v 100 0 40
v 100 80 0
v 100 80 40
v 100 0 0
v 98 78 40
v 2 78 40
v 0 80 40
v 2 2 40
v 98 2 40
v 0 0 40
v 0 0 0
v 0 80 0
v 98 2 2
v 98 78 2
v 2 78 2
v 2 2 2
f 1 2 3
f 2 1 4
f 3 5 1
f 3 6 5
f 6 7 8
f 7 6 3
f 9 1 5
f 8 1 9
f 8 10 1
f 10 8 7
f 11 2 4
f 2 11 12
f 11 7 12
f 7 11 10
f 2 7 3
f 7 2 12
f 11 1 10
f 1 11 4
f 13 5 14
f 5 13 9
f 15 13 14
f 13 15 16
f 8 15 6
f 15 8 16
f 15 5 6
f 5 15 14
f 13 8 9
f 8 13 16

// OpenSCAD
difference() {

    cube([100,80,40]);

    translate([2,2,2])
        cube([96,76,38]);

}
